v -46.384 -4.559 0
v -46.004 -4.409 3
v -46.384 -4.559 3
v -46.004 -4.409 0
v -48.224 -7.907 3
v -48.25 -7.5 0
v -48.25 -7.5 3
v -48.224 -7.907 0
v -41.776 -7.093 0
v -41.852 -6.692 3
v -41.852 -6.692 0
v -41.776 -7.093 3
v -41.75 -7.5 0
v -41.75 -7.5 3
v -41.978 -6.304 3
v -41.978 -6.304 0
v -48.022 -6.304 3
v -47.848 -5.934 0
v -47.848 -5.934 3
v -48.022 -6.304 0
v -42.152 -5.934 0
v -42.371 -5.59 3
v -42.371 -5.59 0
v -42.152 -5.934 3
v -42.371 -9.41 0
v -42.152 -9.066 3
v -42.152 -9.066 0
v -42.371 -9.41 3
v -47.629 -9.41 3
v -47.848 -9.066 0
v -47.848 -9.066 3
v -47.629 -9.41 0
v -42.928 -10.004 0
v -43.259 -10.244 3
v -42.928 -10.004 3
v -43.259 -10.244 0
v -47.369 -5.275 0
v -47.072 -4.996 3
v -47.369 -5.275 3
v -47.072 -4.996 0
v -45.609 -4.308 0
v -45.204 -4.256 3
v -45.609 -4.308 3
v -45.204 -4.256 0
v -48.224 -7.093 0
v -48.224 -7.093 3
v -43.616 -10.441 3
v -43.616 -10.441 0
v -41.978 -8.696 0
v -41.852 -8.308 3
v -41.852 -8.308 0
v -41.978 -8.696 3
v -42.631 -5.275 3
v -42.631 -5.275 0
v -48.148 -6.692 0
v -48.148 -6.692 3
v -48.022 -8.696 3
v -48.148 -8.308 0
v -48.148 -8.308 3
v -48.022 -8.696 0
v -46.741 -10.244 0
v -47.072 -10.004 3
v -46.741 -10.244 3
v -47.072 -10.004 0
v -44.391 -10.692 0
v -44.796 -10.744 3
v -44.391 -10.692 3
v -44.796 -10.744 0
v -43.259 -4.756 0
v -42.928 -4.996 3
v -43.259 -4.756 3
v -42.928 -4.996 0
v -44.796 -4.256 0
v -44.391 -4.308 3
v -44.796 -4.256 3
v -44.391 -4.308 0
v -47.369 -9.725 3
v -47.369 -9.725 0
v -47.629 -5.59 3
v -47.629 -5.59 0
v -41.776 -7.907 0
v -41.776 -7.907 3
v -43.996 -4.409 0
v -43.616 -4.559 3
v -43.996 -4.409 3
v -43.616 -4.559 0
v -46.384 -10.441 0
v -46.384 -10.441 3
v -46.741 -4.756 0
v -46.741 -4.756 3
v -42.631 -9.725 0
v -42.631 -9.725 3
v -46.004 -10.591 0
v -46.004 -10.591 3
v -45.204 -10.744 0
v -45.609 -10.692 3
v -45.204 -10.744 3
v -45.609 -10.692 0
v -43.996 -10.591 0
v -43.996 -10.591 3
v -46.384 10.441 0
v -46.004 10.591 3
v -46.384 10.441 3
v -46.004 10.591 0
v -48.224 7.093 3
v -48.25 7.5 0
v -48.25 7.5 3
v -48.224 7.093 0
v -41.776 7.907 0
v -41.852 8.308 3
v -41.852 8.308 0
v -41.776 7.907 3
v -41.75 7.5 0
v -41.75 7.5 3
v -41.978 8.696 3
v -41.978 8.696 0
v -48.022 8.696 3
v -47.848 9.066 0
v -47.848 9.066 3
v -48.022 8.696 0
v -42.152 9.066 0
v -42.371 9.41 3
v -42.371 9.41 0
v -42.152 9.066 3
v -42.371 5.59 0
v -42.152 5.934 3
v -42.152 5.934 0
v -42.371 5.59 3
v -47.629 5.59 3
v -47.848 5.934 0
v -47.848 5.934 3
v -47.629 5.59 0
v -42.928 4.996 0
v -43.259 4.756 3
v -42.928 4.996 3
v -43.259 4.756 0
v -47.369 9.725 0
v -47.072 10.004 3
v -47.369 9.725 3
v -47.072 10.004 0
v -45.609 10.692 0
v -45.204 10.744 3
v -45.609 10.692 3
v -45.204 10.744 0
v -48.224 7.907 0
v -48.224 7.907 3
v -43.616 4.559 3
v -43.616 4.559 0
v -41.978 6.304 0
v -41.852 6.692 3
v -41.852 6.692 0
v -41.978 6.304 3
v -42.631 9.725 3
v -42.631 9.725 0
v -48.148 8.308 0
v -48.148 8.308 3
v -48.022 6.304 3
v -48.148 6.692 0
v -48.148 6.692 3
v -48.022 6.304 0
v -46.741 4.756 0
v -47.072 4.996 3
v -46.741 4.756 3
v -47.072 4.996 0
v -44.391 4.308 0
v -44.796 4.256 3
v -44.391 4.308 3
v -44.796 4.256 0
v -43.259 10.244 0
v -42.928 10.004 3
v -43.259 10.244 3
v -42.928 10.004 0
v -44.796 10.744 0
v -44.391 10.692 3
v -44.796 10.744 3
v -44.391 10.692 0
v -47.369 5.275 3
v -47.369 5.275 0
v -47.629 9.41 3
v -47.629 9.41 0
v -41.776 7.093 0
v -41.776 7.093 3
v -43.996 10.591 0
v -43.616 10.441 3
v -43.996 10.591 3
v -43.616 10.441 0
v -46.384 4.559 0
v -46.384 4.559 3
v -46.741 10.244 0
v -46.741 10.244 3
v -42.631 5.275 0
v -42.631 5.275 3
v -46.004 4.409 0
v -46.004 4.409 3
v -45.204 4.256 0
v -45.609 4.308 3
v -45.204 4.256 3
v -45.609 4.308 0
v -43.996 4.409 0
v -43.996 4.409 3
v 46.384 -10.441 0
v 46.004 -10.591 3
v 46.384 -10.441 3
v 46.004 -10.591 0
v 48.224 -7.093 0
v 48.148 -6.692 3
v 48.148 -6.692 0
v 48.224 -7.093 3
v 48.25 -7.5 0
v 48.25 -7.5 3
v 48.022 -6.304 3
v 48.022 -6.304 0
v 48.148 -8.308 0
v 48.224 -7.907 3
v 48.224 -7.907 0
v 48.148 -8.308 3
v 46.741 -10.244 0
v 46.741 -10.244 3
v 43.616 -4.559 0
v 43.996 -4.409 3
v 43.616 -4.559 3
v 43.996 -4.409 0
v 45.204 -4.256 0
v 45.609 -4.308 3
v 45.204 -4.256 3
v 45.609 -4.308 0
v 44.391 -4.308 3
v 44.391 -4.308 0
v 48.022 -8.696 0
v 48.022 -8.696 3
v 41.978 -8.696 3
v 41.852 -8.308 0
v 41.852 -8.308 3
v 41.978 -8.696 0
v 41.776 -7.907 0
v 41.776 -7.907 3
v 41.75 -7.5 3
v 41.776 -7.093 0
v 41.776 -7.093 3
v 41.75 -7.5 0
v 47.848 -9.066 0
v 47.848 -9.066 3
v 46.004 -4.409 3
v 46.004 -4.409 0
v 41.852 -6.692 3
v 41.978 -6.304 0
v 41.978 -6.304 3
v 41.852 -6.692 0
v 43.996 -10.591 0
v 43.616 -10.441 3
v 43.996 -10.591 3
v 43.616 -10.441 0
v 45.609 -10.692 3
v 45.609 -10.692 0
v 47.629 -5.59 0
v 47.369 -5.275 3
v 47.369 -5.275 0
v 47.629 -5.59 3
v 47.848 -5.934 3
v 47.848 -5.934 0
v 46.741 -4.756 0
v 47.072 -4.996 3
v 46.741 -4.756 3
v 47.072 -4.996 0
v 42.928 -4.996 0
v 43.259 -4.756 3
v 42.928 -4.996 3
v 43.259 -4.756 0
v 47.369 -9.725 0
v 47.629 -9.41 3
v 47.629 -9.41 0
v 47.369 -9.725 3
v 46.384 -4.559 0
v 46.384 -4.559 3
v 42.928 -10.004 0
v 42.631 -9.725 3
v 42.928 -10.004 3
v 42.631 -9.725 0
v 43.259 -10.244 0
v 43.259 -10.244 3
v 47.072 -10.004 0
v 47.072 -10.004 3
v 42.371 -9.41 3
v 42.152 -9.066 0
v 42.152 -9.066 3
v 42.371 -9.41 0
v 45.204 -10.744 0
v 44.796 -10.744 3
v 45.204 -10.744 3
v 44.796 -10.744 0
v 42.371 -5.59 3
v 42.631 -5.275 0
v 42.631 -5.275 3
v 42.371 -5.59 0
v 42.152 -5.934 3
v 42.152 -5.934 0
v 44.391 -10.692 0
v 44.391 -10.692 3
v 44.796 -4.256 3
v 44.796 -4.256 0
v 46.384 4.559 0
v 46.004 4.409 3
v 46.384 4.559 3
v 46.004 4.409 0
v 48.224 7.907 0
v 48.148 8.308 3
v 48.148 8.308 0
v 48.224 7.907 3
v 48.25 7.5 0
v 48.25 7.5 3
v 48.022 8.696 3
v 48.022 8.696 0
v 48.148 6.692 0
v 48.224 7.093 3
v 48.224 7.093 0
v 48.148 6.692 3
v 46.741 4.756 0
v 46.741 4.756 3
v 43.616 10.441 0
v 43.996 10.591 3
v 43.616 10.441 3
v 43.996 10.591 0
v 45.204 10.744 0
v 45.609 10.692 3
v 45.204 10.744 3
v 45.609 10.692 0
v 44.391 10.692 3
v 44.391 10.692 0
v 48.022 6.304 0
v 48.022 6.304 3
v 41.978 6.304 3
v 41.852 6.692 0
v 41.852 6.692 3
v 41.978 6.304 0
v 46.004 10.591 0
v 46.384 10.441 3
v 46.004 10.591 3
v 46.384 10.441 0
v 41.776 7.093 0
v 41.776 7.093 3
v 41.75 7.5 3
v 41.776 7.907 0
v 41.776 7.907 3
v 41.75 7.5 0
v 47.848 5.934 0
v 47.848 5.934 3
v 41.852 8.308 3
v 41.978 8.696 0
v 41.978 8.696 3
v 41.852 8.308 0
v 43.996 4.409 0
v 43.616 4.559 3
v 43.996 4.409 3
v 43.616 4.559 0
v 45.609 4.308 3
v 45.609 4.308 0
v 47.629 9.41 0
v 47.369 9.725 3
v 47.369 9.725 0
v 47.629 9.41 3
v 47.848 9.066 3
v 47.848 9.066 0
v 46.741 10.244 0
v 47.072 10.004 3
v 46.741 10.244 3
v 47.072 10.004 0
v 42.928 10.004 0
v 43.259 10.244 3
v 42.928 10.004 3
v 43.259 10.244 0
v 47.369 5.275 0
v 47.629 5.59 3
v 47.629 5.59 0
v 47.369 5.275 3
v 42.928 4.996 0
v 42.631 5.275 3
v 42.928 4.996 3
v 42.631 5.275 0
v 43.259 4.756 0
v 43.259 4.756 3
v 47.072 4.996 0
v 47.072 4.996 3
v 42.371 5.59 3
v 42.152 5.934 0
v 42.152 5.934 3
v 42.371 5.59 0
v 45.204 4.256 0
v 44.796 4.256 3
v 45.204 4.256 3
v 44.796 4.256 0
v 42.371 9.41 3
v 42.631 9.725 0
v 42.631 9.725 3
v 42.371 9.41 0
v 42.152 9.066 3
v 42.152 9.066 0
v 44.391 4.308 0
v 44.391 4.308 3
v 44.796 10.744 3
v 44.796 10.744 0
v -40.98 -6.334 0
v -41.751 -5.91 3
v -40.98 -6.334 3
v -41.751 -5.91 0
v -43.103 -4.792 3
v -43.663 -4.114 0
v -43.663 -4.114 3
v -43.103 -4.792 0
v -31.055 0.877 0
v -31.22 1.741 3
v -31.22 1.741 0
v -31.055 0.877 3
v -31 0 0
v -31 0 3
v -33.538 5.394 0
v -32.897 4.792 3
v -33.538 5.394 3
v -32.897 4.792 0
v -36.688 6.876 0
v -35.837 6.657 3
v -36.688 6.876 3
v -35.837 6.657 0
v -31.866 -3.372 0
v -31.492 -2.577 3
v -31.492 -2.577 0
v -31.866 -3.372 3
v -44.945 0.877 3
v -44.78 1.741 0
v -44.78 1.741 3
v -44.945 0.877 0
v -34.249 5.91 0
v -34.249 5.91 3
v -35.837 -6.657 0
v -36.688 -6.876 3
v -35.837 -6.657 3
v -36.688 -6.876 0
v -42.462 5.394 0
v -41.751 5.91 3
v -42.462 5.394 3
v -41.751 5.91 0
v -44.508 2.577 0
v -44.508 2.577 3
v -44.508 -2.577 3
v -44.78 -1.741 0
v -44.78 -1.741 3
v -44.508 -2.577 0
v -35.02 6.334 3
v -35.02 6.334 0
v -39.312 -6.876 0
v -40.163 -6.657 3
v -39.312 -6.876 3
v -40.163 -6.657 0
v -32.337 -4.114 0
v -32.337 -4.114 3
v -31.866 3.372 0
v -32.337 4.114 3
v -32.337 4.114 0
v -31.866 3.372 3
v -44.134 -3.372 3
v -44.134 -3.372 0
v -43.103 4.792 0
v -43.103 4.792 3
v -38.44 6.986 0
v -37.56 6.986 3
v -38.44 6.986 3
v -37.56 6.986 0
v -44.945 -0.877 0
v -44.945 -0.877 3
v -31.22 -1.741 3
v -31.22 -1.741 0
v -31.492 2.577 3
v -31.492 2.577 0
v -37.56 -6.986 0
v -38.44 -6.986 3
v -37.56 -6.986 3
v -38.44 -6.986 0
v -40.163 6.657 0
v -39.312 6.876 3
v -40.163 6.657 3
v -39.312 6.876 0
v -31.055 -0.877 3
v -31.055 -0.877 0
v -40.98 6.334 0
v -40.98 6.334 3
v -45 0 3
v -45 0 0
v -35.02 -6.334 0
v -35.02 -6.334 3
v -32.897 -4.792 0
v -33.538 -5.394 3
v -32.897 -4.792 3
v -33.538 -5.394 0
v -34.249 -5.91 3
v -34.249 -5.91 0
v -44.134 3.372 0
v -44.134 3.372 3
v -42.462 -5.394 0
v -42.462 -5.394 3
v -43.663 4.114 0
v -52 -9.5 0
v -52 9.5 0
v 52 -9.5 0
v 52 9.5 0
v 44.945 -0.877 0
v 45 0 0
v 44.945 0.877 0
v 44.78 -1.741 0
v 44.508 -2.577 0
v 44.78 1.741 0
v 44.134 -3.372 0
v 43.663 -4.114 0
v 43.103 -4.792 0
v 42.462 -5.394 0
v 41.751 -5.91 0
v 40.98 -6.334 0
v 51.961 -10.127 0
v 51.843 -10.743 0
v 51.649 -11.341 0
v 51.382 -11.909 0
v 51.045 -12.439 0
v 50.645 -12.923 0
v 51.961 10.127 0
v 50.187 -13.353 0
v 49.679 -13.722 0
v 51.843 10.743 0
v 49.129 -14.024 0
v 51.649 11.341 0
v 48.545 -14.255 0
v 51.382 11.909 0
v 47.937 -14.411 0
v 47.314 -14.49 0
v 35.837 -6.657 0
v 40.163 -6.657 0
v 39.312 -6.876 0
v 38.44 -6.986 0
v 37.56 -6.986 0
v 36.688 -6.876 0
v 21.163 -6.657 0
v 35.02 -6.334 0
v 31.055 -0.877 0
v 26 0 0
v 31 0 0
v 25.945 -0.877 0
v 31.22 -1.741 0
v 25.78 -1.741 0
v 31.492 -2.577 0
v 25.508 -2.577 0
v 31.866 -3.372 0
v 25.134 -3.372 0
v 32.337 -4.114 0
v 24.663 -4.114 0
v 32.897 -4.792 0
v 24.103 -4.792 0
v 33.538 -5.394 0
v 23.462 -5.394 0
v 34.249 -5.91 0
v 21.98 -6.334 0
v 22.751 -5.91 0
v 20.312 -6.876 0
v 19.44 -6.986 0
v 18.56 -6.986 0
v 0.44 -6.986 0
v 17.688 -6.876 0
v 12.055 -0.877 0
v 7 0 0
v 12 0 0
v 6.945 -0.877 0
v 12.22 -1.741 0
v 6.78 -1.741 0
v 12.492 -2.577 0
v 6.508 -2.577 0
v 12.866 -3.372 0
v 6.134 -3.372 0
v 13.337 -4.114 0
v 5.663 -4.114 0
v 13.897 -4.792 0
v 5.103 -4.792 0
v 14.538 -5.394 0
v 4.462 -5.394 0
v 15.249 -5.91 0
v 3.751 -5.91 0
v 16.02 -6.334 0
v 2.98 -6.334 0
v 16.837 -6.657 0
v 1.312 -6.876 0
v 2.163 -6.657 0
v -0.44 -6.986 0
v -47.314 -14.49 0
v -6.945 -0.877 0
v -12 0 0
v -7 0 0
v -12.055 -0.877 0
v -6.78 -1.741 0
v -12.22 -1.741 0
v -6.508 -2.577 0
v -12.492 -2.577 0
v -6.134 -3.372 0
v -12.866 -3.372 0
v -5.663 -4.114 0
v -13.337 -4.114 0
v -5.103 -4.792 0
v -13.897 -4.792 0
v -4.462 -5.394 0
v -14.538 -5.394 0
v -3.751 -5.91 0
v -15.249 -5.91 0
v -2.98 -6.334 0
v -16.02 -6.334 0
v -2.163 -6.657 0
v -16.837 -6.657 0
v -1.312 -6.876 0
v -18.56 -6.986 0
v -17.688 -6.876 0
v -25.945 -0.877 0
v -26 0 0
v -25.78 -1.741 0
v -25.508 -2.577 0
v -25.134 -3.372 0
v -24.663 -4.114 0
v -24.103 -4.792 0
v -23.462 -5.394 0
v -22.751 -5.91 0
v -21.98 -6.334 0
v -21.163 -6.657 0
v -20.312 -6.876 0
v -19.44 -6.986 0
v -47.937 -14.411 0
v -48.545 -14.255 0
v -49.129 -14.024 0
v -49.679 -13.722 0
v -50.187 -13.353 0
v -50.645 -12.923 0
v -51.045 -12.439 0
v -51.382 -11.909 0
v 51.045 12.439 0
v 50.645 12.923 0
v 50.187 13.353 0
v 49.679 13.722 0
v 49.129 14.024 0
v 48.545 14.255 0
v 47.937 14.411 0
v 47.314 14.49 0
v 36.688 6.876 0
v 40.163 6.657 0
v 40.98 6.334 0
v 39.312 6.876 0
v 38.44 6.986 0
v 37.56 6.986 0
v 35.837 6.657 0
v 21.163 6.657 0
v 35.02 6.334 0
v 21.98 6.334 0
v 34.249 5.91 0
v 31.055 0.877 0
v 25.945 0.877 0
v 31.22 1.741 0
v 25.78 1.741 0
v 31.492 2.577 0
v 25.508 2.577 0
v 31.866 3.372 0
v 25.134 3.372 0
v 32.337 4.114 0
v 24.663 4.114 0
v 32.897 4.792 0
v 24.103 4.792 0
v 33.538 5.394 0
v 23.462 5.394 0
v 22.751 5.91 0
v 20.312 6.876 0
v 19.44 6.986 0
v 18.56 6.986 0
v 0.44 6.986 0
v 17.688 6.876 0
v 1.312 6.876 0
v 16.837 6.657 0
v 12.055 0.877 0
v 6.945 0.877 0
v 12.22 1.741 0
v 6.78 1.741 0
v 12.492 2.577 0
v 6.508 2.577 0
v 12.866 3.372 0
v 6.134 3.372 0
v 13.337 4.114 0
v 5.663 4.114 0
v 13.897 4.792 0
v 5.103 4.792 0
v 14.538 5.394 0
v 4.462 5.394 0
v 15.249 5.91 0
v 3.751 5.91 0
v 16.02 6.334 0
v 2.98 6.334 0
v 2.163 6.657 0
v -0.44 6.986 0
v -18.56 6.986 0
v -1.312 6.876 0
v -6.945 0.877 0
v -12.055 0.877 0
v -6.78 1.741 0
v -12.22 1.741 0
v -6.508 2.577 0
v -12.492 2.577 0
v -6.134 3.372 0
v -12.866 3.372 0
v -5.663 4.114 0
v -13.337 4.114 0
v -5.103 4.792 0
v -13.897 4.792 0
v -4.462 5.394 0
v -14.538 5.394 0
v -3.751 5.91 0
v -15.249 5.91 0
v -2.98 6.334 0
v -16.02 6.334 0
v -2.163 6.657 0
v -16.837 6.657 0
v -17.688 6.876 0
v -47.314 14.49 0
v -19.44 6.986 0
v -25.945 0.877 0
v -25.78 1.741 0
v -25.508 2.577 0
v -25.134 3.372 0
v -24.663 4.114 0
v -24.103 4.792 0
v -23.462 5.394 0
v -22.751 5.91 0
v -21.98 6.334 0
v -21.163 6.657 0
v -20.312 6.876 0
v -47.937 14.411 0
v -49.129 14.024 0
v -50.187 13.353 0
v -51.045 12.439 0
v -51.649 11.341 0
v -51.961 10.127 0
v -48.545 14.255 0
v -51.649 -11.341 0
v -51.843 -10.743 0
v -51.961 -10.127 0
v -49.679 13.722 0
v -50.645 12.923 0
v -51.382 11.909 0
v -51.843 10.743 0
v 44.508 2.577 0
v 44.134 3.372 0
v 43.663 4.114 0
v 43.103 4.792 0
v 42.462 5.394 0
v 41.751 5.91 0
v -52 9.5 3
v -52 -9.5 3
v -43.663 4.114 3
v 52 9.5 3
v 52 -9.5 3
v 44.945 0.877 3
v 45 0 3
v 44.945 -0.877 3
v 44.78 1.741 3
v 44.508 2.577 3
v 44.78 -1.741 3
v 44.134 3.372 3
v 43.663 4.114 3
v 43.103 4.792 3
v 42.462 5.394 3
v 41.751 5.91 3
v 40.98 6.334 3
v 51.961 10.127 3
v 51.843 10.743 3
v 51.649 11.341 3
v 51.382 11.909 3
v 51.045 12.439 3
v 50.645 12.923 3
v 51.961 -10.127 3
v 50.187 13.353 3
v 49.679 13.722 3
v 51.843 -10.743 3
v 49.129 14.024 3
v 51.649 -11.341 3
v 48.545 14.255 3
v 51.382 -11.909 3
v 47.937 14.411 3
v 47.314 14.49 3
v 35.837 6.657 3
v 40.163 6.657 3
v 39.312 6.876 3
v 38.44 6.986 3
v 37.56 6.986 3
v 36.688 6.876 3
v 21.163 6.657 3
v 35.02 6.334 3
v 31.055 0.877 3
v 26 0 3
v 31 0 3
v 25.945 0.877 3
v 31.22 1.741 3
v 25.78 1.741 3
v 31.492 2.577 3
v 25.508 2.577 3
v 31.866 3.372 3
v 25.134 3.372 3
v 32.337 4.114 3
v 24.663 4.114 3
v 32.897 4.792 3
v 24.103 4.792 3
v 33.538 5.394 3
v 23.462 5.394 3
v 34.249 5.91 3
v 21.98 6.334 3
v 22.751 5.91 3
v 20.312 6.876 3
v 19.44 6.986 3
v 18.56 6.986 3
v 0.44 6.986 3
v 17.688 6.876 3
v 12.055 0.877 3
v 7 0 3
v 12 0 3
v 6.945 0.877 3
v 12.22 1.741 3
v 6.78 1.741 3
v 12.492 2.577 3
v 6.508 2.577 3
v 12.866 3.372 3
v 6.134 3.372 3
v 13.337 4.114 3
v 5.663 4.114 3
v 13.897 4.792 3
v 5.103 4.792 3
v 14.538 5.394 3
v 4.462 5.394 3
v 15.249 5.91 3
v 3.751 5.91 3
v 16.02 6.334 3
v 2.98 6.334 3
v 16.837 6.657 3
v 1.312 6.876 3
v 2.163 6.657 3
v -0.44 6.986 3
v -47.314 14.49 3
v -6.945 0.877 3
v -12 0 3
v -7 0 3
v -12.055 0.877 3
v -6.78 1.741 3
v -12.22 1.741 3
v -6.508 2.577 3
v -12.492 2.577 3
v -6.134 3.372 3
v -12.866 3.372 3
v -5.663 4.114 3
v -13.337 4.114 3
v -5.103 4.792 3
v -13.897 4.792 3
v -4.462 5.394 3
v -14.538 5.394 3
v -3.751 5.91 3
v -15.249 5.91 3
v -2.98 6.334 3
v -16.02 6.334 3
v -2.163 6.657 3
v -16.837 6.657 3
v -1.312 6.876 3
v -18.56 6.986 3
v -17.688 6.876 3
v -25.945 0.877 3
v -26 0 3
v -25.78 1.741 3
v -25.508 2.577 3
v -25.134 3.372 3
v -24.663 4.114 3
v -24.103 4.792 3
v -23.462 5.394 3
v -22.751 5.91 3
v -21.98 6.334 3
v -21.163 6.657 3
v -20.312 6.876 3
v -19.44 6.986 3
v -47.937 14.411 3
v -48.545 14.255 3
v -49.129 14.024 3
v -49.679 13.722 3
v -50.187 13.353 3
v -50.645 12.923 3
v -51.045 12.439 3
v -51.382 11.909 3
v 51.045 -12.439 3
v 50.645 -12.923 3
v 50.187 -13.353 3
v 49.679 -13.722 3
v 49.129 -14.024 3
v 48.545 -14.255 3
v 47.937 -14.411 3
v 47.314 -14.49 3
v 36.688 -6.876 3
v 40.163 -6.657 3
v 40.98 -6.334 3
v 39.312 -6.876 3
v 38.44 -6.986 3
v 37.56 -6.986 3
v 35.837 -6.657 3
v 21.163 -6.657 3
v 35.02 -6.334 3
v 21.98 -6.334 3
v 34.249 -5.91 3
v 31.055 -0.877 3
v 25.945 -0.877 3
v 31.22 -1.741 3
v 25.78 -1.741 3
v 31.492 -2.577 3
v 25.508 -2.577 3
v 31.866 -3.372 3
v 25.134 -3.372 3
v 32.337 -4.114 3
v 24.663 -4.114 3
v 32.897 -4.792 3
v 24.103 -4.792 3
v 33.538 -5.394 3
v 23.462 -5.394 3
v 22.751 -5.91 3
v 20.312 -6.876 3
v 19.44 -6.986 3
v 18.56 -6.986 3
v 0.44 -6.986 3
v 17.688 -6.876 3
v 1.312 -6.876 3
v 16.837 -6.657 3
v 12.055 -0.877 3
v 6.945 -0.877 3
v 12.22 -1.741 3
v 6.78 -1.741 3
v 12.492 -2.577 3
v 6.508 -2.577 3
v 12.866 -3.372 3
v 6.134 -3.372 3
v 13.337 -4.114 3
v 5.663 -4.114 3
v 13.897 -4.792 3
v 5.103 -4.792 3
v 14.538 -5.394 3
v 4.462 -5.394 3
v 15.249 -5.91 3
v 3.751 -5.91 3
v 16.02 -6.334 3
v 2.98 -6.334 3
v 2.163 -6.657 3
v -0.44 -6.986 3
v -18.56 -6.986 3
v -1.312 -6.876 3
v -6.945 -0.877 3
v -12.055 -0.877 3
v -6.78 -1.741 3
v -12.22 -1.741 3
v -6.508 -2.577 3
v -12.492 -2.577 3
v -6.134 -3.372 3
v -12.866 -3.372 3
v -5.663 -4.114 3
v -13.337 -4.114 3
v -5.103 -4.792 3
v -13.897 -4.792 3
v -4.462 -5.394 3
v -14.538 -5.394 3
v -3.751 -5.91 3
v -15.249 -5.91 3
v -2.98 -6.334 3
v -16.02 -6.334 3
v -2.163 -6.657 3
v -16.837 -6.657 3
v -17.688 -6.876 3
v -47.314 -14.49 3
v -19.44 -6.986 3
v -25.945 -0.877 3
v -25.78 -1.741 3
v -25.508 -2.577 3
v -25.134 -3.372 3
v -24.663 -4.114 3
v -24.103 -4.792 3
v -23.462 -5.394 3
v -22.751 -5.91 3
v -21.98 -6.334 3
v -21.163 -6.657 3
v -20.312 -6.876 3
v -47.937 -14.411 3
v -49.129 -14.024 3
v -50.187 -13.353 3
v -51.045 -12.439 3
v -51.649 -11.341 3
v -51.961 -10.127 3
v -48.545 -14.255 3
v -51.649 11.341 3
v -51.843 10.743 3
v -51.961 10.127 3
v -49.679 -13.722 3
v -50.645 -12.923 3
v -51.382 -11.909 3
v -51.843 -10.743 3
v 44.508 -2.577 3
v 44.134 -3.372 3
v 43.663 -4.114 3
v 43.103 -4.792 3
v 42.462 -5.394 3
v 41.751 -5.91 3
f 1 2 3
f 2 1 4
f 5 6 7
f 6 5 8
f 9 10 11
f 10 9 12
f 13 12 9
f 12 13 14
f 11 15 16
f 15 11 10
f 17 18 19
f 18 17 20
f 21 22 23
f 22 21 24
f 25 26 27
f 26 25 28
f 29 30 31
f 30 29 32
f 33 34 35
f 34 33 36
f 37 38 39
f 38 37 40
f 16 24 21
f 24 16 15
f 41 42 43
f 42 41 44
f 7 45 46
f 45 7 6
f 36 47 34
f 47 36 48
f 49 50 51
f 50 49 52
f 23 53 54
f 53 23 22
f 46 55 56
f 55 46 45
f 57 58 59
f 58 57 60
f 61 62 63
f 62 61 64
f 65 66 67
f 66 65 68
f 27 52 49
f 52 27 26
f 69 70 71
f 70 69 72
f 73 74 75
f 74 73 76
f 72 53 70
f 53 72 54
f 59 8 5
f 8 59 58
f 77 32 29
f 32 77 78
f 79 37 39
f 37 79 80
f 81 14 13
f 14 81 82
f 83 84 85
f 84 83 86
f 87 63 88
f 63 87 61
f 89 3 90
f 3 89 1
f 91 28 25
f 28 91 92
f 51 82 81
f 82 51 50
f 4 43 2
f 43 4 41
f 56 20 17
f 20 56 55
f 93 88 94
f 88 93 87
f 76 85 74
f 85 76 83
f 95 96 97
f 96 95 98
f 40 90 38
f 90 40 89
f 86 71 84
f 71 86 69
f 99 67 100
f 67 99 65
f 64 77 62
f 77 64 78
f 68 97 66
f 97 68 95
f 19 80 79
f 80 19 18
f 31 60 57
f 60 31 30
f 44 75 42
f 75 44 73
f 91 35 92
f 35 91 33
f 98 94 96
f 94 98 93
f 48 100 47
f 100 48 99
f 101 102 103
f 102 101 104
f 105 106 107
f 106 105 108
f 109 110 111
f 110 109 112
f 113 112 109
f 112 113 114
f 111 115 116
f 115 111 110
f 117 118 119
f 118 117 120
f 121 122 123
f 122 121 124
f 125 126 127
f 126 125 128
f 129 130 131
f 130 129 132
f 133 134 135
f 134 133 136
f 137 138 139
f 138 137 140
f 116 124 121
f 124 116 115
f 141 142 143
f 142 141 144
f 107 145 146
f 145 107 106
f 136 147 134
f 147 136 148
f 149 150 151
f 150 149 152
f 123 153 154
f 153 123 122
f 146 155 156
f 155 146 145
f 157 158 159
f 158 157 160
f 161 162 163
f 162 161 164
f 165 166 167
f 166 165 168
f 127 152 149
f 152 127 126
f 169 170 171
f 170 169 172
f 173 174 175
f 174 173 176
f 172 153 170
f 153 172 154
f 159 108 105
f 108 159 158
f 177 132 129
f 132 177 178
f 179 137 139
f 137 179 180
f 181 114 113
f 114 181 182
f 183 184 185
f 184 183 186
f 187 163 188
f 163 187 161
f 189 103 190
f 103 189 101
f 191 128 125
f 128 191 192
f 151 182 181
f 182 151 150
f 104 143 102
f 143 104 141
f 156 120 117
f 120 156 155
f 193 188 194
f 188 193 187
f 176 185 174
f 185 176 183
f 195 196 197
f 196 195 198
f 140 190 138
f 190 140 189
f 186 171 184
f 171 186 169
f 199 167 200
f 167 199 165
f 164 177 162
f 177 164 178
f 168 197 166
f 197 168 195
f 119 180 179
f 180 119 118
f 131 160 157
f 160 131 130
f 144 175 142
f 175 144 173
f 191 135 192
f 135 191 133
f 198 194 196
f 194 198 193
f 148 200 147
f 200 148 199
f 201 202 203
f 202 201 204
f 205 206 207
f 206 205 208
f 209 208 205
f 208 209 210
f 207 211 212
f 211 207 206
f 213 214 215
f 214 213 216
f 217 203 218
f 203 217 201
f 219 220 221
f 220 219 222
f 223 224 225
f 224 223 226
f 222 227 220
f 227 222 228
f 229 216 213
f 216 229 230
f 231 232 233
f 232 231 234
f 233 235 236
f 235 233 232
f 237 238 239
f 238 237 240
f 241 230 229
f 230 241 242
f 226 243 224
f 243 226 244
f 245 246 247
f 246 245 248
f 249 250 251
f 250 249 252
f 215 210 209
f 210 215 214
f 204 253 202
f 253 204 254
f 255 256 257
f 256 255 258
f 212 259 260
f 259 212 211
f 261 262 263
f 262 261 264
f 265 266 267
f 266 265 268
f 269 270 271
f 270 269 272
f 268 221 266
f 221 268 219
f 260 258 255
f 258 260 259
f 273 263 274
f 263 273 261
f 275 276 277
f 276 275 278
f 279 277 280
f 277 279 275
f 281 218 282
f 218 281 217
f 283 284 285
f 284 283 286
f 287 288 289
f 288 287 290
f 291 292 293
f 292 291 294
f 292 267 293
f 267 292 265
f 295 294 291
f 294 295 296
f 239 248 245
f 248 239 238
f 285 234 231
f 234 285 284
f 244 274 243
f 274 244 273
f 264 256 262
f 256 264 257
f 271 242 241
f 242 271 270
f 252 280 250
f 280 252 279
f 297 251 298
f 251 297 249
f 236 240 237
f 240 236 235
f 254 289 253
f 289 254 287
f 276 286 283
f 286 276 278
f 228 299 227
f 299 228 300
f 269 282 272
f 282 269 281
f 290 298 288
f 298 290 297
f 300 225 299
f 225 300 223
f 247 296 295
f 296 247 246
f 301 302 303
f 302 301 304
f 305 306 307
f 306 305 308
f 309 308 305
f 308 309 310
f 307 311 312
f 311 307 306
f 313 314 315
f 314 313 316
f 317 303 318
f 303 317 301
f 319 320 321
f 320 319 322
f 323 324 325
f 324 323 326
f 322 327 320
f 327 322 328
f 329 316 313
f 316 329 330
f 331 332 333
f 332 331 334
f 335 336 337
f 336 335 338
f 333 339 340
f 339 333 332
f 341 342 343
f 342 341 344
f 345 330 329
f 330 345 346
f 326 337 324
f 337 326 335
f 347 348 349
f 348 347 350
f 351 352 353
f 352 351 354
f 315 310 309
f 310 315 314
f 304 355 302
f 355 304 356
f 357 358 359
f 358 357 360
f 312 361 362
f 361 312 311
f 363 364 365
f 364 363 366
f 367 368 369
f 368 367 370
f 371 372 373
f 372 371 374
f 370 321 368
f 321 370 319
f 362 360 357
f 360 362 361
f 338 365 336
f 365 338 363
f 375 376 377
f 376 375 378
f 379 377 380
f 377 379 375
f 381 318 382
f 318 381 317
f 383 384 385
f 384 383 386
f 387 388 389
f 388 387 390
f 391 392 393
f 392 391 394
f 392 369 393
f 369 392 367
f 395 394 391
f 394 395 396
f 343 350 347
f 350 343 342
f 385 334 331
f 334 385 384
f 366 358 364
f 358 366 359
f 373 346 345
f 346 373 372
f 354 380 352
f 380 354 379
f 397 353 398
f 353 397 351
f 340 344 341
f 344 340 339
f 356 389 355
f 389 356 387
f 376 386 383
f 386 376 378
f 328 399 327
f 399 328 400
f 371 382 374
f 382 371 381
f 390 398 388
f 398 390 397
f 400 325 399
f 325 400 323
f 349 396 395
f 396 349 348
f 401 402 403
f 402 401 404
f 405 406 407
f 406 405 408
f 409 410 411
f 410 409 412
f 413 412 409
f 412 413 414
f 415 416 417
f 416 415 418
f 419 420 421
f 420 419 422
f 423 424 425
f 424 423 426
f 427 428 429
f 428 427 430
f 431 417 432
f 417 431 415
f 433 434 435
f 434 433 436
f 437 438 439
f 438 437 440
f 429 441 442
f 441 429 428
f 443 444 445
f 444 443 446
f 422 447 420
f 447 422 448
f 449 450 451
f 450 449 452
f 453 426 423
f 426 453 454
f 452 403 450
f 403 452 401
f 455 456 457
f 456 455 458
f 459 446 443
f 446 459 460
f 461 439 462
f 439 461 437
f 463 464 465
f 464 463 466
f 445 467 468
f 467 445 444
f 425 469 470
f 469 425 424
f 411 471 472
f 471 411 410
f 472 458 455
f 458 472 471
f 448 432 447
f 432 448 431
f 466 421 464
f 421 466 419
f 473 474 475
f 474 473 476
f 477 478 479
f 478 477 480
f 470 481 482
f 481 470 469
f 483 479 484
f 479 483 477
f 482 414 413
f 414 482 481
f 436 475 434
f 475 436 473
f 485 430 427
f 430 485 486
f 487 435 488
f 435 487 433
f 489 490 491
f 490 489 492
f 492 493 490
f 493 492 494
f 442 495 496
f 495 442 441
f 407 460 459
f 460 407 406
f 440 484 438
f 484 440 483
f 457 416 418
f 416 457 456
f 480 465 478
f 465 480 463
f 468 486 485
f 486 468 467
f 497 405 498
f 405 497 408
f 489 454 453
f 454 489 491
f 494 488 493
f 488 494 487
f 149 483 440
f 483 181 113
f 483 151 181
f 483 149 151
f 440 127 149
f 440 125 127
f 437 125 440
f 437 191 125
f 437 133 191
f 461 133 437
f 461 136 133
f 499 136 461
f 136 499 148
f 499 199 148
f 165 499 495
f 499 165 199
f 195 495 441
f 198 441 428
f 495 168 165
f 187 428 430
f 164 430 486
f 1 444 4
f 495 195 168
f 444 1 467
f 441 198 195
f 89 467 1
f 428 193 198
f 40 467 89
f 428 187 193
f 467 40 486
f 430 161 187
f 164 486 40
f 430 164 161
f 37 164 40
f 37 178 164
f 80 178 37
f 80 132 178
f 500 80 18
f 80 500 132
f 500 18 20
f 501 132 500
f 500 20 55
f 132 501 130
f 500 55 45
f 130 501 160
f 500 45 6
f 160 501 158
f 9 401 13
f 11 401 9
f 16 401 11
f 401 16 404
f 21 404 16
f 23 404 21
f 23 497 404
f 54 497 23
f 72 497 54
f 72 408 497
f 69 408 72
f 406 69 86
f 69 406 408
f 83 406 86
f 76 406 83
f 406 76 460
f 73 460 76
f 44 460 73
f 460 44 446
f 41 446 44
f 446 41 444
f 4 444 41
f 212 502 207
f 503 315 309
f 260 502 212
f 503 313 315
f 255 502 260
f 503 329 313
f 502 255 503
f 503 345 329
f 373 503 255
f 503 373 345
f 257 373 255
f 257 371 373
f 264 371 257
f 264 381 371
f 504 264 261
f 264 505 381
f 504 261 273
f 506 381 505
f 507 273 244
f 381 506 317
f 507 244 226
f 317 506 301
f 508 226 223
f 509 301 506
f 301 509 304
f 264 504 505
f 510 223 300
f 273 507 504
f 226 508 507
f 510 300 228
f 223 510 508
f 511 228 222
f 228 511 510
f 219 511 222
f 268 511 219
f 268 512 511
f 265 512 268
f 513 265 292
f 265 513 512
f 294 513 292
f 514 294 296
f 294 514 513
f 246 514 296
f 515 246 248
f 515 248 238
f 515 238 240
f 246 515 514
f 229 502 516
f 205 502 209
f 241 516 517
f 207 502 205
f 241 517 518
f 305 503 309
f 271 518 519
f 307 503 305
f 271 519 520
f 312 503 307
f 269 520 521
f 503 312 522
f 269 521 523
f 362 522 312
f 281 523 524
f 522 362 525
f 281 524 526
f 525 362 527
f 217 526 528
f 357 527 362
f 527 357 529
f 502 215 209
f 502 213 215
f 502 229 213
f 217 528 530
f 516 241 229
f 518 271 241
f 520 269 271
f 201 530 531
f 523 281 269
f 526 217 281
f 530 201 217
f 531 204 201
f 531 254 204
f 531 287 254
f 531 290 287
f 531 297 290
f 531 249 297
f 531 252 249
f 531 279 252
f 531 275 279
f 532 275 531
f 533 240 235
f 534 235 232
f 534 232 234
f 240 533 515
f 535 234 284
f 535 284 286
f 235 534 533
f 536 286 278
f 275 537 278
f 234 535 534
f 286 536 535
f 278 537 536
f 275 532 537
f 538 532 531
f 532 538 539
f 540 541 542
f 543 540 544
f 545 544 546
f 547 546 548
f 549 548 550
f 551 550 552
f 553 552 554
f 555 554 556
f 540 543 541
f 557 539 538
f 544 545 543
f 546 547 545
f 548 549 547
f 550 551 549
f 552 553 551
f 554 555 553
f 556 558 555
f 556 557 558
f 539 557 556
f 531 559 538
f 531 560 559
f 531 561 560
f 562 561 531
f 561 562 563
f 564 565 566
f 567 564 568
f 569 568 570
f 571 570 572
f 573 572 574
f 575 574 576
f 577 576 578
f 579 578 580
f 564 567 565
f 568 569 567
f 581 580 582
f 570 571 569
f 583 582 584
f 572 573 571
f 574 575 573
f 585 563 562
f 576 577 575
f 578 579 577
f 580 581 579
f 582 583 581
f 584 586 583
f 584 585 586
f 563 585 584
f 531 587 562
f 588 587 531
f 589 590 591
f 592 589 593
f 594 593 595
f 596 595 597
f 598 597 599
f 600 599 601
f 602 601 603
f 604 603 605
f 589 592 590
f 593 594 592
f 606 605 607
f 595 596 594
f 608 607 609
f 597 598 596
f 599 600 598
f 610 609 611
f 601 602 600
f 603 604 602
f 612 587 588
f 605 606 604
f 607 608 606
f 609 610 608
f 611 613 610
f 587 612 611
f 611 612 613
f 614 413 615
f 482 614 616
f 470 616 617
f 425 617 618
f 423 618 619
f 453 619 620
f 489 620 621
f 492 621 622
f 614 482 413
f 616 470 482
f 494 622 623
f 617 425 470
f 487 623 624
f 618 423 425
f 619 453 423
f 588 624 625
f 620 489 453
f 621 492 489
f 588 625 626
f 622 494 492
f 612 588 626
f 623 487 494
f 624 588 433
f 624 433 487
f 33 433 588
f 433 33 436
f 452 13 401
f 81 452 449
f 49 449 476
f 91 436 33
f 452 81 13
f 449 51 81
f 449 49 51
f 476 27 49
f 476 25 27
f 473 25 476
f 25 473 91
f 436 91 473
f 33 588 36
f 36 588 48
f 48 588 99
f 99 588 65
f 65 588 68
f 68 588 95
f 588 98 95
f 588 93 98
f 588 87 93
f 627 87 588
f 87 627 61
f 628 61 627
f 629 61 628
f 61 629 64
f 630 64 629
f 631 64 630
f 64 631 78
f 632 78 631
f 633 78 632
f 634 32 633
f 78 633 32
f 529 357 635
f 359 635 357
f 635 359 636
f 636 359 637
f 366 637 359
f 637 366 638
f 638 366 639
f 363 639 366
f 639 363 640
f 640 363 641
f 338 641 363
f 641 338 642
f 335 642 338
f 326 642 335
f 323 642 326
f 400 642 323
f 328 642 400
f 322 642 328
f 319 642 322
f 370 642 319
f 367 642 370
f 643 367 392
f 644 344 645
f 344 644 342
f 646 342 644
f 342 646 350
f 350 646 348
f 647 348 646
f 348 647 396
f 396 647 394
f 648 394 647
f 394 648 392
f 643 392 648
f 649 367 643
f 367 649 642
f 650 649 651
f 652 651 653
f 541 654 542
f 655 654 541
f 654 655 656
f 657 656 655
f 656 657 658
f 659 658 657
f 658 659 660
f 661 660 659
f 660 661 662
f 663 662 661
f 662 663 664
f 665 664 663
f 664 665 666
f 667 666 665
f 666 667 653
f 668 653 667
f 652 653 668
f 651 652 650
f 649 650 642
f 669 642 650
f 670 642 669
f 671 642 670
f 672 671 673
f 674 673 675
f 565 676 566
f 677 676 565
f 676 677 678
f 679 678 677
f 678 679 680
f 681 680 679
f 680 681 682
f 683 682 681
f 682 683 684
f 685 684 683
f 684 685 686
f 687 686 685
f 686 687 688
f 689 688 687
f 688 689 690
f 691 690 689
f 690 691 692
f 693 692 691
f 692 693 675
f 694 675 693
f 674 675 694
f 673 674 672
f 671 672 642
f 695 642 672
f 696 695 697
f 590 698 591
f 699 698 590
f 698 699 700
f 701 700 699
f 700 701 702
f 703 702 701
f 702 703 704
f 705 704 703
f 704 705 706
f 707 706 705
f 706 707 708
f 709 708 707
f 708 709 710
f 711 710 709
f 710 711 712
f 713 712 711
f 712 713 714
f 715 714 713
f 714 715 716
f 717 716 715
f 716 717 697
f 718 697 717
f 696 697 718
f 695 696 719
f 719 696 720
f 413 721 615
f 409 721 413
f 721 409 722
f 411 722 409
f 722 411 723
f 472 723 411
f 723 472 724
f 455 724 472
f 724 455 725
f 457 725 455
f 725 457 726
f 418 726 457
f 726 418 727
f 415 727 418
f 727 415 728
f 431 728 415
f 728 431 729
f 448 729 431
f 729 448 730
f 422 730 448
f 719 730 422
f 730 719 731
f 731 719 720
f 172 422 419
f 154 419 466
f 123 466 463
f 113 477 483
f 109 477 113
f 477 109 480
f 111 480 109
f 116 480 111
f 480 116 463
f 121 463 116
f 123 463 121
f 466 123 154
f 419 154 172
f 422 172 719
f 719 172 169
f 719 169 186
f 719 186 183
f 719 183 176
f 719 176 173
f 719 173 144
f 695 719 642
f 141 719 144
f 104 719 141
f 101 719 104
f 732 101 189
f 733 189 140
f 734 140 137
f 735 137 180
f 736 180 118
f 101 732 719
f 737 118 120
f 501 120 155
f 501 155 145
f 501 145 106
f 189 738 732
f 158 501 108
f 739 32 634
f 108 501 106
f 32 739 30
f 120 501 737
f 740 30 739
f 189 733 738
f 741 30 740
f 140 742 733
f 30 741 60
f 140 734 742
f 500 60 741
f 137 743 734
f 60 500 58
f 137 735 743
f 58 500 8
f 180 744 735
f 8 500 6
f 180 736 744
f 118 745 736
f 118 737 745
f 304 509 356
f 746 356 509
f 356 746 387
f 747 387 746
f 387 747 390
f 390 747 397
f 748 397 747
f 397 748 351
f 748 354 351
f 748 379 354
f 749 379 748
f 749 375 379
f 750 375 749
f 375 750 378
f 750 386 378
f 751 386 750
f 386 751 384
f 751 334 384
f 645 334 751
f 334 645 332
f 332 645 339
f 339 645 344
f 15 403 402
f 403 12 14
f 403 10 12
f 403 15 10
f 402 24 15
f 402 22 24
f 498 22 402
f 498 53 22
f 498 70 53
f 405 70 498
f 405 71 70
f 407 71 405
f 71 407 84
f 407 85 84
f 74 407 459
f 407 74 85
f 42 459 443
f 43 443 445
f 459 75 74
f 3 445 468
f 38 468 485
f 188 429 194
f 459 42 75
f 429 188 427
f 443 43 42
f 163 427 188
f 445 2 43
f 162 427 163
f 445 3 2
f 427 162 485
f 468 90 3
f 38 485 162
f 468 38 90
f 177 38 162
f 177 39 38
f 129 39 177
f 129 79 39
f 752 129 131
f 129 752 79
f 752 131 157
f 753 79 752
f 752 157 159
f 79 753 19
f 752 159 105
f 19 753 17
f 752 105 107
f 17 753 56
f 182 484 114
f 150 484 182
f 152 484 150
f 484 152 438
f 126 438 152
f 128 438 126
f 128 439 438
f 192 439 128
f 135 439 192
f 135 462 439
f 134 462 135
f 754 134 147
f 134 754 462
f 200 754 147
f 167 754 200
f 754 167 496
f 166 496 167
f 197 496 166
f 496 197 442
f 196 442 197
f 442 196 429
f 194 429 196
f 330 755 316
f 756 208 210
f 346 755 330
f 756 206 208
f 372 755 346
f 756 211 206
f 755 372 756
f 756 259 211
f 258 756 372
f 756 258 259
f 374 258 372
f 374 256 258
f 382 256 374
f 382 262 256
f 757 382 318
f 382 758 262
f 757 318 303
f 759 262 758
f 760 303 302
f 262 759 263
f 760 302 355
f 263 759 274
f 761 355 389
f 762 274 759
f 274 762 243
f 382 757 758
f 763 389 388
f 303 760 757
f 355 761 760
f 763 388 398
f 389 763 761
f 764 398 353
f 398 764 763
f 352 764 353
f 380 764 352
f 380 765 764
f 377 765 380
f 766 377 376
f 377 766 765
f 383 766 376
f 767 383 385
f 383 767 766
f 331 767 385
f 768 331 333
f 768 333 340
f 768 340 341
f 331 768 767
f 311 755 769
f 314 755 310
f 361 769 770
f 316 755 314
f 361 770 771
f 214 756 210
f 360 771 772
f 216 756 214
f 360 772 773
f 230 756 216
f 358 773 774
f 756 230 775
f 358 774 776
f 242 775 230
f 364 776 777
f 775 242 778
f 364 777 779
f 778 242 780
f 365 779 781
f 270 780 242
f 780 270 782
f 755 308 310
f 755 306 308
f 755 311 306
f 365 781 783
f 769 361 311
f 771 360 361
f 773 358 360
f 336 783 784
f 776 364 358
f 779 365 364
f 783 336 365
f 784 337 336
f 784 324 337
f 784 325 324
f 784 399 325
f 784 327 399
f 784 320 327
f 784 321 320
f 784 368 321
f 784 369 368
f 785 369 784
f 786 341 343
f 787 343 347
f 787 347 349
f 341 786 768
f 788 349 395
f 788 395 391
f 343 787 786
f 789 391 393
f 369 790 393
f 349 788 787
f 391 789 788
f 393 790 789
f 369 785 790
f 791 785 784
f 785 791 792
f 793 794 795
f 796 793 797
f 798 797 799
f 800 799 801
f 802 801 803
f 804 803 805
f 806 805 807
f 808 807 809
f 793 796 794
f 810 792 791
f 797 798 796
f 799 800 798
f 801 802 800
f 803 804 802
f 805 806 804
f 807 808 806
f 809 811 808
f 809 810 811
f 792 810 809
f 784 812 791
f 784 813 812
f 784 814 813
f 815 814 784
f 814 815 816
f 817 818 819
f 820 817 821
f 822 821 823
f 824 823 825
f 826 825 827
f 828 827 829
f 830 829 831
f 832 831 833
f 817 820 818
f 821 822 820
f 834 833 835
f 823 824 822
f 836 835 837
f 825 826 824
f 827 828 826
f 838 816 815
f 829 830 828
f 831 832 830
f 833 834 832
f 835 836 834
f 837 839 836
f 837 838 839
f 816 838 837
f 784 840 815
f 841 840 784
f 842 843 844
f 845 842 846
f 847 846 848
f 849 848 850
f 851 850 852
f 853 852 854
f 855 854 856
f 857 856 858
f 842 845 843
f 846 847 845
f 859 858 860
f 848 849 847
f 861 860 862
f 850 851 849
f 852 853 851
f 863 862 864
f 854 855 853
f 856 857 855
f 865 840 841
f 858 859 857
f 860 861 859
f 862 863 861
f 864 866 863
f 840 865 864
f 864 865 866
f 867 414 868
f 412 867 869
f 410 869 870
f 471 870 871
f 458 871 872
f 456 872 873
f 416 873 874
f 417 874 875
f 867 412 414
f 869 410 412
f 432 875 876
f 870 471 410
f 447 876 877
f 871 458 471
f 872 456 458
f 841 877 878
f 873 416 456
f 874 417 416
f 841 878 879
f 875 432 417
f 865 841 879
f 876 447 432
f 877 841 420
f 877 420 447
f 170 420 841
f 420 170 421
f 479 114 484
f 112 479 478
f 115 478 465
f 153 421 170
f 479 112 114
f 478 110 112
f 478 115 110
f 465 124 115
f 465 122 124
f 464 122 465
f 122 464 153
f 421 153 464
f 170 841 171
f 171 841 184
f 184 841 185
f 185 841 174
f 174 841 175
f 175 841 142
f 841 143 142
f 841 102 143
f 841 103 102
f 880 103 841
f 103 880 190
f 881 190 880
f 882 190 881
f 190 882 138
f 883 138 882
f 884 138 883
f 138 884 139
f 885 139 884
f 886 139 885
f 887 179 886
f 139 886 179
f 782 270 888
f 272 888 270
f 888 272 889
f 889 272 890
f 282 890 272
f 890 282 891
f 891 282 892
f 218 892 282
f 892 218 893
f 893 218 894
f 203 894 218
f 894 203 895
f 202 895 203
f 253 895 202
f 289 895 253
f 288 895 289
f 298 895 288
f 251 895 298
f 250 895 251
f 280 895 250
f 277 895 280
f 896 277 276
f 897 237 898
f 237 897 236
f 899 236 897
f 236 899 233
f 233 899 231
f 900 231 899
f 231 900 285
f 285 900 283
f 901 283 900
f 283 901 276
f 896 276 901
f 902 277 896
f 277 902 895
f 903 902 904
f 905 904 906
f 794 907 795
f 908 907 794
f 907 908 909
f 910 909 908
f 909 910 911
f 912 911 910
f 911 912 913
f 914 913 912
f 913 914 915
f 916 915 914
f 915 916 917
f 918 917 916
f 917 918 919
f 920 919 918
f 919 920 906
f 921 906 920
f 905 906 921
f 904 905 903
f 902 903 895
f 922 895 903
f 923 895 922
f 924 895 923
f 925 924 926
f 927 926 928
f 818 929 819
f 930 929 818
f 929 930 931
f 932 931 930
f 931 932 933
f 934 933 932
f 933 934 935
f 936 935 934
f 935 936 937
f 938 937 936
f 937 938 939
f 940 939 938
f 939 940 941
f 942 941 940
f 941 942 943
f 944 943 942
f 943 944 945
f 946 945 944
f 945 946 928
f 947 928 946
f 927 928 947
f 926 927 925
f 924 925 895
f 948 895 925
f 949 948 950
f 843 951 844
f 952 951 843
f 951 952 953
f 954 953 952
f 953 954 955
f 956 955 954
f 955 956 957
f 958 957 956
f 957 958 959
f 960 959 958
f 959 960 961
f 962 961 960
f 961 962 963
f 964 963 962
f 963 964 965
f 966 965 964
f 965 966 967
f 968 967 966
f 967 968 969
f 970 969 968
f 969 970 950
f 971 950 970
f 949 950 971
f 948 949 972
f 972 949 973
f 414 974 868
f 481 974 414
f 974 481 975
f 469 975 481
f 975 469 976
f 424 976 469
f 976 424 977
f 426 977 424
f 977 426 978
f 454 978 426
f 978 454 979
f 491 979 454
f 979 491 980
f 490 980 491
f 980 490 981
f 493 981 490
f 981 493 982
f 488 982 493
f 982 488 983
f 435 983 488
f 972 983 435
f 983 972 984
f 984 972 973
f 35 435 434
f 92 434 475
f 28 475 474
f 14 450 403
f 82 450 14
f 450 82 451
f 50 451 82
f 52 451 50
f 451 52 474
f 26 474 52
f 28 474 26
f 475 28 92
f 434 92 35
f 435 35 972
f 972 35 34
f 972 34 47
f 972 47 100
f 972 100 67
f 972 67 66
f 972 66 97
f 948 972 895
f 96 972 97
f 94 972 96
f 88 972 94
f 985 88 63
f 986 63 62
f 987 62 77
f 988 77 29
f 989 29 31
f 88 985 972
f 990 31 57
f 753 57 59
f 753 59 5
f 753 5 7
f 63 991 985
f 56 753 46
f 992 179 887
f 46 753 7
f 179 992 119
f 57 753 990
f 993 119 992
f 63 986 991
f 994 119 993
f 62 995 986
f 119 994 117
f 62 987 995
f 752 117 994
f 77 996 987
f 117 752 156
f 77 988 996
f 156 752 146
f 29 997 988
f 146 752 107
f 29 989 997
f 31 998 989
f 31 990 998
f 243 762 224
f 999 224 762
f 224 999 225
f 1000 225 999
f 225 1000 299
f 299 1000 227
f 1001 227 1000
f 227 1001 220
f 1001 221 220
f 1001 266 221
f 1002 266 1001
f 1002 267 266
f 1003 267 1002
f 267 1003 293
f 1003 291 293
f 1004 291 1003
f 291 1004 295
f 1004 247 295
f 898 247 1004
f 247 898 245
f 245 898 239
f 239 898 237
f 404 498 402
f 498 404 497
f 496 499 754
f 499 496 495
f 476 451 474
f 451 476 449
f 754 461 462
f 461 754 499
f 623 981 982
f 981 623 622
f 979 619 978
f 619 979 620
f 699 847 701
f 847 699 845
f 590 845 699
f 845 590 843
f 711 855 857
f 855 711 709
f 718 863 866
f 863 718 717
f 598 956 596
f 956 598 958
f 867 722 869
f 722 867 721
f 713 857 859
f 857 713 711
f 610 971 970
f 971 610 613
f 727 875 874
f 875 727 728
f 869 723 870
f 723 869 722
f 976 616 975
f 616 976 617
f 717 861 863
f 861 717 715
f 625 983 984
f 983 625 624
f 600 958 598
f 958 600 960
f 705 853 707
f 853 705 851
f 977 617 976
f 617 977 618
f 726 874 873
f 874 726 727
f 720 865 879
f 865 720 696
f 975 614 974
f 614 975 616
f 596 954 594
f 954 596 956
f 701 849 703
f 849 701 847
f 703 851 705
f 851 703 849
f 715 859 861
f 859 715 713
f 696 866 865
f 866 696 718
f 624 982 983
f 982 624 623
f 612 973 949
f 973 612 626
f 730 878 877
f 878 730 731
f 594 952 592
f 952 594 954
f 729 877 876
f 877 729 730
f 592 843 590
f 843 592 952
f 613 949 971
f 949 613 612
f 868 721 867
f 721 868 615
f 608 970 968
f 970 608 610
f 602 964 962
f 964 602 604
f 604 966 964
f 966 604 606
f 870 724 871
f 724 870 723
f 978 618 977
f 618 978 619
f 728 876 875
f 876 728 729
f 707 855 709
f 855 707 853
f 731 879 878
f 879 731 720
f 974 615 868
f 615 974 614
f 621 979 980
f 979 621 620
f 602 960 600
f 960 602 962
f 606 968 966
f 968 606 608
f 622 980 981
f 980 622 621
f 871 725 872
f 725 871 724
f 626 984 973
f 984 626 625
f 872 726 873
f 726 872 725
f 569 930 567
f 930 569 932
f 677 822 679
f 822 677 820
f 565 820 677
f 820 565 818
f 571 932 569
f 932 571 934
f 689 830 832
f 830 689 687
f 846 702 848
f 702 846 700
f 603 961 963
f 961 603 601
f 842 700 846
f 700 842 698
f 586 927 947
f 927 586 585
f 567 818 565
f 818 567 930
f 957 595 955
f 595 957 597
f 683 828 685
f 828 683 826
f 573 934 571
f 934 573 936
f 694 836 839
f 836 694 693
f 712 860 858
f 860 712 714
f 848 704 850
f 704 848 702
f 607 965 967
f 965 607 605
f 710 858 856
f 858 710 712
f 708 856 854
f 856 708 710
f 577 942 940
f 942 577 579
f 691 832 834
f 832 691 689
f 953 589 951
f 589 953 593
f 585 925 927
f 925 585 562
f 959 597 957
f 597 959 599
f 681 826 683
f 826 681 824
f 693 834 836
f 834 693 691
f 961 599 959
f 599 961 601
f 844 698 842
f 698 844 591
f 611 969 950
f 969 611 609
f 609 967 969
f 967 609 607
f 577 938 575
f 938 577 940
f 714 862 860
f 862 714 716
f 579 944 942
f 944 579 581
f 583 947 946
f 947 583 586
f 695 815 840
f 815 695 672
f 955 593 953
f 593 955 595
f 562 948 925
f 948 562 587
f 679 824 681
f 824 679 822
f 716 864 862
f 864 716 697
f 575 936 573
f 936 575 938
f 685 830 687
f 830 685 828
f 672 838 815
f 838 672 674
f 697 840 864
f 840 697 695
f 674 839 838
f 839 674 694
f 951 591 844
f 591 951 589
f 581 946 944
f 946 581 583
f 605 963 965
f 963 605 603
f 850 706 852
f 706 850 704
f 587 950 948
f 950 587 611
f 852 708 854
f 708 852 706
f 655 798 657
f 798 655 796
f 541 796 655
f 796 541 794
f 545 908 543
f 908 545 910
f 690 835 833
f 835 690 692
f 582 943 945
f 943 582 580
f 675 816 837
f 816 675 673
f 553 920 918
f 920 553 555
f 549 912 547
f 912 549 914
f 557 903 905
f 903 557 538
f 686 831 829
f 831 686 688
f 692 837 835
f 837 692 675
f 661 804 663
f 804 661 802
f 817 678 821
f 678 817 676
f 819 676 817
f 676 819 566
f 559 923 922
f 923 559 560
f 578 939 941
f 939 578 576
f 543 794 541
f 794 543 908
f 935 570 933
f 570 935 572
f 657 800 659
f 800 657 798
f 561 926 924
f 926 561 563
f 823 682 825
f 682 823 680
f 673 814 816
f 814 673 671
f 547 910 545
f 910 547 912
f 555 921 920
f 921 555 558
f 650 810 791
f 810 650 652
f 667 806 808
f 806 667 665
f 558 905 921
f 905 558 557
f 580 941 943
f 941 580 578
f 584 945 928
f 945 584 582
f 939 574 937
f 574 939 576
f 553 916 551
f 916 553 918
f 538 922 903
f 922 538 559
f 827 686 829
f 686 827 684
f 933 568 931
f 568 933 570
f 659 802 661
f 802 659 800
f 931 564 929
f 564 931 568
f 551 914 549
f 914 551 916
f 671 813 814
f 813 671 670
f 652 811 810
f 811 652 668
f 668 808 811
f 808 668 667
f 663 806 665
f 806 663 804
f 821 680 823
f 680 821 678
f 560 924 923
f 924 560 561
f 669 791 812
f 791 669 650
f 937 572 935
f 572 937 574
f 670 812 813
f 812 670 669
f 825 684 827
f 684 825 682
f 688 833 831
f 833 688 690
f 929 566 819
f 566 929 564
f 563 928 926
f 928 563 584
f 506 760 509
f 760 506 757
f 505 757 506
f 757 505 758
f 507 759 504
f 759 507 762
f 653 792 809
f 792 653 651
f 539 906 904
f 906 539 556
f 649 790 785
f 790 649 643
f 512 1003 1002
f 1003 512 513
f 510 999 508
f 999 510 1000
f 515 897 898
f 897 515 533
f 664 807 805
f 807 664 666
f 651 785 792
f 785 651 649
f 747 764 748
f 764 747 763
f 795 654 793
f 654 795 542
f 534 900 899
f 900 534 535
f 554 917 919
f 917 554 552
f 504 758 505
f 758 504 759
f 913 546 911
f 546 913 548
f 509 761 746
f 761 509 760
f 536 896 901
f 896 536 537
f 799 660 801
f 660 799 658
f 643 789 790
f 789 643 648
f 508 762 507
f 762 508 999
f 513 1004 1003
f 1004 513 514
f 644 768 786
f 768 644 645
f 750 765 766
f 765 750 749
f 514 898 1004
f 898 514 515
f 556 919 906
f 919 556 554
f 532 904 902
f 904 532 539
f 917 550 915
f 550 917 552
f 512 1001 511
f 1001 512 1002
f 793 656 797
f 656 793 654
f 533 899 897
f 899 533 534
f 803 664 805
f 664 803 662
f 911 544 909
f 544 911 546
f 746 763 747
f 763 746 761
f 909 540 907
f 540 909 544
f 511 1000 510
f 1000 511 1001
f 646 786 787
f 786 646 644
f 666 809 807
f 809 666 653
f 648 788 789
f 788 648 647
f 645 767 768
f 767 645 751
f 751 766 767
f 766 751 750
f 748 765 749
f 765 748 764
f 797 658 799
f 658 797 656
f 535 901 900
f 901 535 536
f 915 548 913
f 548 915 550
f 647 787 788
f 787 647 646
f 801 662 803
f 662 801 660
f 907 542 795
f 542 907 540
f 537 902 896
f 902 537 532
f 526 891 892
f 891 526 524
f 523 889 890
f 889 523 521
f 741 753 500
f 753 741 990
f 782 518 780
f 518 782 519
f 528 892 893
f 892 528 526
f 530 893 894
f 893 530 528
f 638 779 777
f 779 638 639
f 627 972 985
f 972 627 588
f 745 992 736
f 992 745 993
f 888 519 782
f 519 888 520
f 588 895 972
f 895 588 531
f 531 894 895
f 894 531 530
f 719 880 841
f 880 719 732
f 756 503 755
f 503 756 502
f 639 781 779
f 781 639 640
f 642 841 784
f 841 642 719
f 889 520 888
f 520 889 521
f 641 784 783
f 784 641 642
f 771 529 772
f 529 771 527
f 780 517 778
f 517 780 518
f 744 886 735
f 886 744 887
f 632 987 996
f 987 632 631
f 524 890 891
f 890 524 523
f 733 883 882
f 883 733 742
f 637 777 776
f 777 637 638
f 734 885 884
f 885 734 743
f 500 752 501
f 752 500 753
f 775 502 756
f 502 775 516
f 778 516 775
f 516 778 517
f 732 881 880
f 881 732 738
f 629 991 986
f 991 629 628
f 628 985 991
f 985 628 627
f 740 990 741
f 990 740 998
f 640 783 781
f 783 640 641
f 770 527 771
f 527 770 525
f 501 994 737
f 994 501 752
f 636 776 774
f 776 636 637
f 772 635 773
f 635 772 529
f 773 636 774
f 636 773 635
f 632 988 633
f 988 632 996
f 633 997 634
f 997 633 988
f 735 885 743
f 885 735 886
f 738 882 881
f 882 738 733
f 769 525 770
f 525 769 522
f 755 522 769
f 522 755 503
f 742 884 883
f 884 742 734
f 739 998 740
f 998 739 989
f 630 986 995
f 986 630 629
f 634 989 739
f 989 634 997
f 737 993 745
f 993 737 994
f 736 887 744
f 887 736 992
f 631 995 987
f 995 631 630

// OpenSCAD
$fn = 50;


difference() {
	union() {
		hull() {
			translate(v = [-47.0000000000, 9.5000000000, 0]) {
				cylinder(h = 3, r = 5);
			}
			translate(v = [47.0000000000, 9.5000000000, 0]) {
				cylinder(h = 3, r = 5);
			}
			translate(v = [-47.0000000000, -9.5000000000, 0]) {
				cylinder(h = 3, r = 5);
			}
			translate(v = [47.0000000000, -9.5000000000, 0]) {
				cylinder(h = 3, r = 5);
			}
		}
	}
	union() {
		#translate(v = [-45.0000000000, -7.5000000000, -100.0000000000]) {
			cylinder(h = 200, r = 3.2500000000);
		}
		#translate(v = [-45.0000000000, 7.5000000000, -100.0000000000]) {
			cylinder(h = 200, r = 3.2500000000);
		}
		#translate(v = [45.0000000000, -7.5000000000, -100.0000000000]) {
			cylinder(h = 200, r = 3.2500000000);
		}
		#translate(v = [45.0000000000, 7.5000000000, -100.0000000000]) {
			cylinder(h = 200, r = 3.2500000000);
		}
		#translate(v = [-38.0000000000, 0, 0]) {
			cylinder(h = 3, r = 7.0000000000);
		}
		#translate(v = [-19.0000000000, 0, 0]) {
			cylinder(h = 3, r = 7.0000000000);
		}
		#cylinder(h = 3, r = 7.0000000000);
		#translate(v = [19.0000000000, 0, 0]) {
			cylinder(h = 3, r = 7.0000000000);
		}
		#translate(v = [38.0000000000, 0, 0]) {
			cylinder(h = 3, r = 7.0000000000);
		}
	}
}
